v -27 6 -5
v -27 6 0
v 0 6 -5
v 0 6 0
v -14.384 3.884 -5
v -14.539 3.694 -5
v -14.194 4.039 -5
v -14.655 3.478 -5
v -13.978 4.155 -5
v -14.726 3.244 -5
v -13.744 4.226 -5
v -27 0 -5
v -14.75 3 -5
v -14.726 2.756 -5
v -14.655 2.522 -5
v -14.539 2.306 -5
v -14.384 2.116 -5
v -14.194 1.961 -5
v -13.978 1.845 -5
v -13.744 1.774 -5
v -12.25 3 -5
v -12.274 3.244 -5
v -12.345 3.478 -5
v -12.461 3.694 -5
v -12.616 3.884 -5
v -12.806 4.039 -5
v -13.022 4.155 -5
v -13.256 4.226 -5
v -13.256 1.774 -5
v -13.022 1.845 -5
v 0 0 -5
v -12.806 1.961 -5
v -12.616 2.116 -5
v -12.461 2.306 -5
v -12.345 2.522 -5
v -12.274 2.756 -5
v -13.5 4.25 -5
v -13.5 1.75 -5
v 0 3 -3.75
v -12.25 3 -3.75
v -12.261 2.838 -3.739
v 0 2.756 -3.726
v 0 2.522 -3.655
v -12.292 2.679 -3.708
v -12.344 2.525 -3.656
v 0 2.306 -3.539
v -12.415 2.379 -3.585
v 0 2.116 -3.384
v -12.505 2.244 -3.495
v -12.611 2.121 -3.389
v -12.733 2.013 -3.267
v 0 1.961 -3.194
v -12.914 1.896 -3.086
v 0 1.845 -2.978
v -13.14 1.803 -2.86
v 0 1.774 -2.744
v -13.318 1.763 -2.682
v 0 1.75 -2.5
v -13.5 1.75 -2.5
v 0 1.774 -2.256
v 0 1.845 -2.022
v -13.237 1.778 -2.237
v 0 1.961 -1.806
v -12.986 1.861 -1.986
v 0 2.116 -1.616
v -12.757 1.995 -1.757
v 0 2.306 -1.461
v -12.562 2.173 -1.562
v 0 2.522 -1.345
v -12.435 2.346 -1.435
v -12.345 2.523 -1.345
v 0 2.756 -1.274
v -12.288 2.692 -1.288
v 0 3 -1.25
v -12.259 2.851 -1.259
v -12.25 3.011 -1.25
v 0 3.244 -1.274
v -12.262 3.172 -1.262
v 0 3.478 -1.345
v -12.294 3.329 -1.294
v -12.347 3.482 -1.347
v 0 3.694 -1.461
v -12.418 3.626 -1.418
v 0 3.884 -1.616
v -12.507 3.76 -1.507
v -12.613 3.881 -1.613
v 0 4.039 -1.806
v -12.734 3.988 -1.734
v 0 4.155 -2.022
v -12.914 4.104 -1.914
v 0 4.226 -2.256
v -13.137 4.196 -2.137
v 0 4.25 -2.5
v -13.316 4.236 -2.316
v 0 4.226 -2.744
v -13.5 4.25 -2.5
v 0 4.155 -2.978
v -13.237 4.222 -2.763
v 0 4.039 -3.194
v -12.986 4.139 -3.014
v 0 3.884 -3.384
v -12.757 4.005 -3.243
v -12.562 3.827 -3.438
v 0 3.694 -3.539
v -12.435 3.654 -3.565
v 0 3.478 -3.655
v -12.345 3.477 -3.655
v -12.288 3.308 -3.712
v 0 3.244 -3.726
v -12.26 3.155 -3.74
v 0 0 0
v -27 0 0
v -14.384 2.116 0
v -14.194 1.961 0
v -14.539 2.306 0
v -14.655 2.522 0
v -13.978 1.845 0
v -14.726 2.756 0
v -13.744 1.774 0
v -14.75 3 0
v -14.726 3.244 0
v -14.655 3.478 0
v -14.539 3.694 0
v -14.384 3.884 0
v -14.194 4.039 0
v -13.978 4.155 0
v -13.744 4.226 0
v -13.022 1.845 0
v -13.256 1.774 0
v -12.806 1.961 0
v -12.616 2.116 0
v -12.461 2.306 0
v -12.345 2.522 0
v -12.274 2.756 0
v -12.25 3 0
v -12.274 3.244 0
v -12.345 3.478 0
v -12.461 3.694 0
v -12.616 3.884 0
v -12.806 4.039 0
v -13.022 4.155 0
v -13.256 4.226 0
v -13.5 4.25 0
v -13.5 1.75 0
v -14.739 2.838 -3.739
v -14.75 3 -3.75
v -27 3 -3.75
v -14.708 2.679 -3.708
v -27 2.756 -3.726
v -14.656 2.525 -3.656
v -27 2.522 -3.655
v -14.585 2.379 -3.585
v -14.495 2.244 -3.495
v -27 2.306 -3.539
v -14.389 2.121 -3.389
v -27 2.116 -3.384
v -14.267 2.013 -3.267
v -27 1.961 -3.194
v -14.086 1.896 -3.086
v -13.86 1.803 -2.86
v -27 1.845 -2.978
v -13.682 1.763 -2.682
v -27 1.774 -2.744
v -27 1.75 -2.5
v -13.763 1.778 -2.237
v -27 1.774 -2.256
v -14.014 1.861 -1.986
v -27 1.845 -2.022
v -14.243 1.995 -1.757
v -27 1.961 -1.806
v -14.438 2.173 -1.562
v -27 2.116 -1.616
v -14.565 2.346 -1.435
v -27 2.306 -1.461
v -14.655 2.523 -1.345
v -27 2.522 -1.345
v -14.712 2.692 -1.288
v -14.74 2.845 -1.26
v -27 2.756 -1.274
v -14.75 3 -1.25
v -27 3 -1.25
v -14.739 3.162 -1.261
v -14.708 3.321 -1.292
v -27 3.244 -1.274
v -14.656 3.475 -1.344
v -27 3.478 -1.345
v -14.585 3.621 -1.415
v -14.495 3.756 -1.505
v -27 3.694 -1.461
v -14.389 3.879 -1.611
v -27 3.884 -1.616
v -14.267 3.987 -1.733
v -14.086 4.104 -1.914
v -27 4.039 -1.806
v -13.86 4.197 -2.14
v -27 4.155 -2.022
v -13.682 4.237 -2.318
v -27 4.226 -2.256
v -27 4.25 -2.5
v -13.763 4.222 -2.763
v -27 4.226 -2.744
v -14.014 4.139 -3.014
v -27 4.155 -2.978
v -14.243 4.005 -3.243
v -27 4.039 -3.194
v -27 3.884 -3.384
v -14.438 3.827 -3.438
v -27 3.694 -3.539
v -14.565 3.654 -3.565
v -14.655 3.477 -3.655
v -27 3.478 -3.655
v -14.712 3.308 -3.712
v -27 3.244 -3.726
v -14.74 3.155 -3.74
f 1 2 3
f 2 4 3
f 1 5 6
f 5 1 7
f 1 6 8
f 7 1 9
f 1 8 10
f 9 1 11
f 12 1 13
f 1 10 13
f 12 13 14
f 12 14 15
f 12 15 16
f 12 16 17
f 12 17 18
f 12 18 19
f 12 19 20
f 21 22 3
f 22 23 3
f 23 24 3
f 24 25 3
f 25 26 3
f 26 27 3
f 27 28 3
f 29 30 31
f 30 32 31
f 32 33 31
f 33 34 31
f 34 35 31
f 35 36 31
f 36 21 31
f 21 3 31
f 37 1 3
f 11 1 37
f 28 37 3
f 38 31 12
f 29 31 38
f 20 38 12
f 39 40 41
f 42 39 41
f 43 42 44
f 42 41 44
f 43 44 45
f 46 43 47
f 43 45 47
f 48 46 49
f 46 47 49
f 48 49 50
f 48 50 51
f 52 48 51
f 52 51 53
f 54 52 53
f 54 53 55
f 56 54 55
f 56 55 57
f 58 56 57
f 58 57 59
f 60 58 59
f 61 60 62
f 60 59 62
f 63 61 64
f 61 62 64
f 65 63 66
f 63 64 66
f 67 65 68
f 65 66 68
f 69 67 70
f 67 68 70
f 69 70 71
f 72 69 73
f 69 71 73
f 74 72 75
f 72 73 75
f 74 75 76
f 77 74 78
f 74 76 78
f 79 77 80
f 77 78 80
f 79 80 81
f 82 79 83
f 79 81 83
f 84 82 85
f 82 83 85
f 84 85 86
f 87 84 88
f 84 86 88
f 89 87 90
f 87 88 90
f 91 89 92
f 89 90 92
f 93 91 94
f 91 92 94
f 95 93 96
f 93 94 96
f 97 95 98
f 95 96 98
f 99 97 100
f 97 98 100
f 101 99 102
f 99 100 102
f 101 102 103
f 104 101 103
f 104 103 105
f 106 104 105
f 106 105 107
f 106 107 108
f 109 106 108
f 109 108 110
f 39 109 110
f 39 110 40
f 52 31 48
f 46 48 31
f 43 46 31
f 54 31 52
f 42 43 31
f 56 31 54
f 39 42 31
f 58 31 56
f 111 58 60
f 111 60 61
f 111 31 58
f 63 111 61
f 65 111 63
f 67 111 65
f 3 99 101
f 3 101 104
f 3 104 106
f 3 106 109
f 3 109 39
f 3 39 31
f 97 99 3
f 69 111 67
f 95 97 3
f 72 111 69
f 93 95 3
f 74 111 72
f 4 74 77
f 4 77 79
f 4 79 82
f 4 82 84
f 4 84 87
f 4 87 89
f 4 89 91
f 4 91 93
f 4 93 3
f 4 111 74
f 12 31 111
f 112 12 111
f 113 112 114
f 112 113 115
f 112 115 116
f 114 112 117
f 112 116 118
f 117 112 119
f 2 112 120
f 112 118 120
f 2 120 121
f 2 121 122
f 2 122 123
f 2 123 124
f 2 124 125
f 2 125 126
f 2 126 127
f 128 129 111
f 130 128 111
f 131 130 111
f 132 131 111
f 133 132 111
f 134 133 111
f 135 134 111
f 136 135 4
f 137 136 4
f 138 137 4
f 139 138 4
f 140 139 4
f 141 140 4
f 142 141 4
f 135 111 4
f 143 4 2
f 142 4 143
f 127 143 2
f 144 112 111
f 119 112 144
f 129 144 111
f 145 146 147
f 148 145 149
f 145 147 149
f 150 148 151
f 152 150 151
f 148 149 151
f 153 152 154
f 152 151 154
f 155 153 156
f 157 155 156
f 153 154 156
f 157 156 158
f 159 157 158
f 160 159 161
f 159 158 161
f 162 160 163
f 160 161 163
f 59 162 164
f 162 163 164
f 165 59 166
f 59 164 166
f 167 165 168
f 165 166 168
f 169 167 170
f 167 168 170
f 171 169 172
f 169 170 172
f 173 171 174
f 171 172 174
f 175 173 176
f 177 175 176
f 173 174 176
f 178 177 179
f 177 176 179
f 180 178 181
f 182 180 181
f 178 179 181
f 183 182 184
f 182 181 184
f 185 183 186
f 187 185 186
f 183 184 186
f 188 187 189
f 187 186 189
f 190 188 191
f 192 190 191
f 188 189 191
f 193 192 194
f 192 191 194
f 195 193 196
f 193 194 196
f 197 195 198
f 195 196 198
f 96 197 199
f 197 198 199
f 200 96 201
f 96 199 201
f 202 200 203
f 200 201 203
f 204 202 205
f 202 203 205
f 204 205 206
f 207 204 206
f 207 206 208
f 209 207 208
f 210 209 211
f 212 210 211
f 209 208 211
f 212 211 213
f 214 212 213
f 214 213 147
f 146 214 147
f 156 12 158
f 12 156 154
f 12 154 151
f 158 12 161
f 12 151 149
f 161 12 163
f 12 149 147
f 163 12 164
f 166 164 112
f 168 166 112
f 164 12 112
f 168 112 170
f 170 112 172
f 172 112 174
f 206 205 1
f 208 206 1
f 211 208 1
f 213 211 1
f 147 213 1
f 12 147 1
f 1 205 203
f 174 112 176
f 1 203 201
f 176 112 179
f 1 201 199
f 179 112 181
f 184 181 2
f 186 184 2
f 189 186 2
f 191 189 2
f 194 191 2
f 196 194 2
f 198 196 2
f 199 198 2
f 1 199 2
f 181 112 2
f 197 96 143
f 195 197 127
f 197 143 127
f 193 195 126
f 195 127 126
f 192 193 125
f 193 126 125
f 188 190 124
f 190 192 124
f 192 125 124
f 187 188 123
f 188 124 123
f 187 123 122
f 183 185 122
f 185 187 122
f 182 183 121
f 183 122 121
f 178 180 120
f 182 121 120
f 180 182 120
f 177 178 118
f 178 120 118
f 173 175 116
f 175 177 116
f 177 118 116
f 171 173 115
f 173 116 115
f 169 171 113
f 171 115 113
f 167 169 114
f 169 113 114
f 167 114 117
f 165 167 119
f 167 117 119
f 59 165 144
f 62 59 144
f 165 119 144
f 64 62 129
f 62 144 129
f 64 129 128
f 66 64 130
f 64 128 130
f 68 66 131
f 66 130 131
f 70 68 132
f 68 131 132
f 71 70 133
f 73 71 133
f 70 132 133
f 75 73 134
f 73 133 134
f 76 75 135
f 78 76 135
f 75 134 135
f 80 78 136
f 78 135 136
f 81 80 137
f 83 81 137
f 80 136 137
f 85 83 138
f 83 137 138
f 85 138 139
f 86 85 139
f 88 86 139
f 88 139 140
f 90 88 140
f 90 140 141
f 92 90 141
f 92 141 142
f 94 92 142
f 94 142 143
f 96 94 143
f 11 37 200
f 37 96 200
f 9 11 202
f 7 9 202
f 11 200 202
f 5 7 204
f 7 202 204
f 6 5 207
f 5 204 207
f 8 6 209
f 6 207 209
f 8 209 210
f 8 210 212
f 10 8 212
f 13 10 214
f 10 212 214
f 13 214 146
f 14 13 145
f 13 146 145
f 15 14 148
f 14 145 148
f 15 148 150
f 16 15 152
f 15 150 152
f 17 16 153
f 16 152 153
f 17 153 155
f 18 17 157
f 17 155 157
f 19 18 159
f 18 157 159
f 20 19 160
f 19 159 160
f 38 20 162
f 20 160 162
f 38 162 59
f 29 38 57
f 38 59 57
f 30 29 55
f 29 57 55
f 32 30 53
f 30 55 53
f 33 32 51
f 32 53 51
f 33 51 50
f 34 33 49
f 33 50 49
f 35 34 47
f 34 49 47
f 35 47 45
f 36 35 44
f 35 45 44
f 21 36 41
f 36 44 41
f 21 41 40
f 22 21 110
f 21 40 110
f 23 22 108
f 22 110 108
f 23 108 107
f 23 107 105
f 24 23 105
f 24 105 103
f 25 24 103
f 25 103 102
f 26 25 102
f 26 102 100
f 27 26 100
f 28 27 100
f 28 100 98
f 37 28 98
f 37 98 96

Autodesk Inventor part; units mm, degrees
ref_plane "YZ Plane" through (0, 0, 0) normal (1, 0, 0) x (0, 1, 0)
ref_plane "XZ Plane" through (0, 0, 0) normal (0, 1, 0) x (-1, 0, 0)
sketch "スケッチ1" plane through (0, 0, 0) normal (1, 0, 0) x (0, 1, 0)
  line L0 (0, 0) -> (6, 0)
  line L1 (6, 0) -> (6, -5)
  line L2 (6, -5) -> (0, -5)
  line L3 (0, -5) -> (0, 0)
  point P0 (3, -2.5)
  dimension "d0" = 6
  dimension "d1" = 5
  dimension "d2" = 3
  dimension "d3" = 2.5
extrude "押し出し1" add sketch "スケッチ1" against normal blind 27
ref_plane "作業平面1" through (-29.5, 0, 0) normal (1, 0, 0) x (0, 0, -1)
hole "穴1" at (0, 3, -2.5) direction (-1, 0, 0) diameter 2.5 end through all
sketch "スケッチ3" plane through (0, 0, -5) normal (0, 0, -1) x (-1, 0, 0)
  line L0 (0, 0) -> (27, 0) projected
  line L1 (0, 0) -> (0, 6) projected
  point P0 (13.5, 3)
  dimension "d19" = 3
  dimension "d20" = 13.5
hole "穴2" at (-13.5, 3, -5) direction (0, 0, 1) diameter 2.5 end through all
properties part number "belt_liner_v5_Plate_9" material "アルミニウム 6061"
